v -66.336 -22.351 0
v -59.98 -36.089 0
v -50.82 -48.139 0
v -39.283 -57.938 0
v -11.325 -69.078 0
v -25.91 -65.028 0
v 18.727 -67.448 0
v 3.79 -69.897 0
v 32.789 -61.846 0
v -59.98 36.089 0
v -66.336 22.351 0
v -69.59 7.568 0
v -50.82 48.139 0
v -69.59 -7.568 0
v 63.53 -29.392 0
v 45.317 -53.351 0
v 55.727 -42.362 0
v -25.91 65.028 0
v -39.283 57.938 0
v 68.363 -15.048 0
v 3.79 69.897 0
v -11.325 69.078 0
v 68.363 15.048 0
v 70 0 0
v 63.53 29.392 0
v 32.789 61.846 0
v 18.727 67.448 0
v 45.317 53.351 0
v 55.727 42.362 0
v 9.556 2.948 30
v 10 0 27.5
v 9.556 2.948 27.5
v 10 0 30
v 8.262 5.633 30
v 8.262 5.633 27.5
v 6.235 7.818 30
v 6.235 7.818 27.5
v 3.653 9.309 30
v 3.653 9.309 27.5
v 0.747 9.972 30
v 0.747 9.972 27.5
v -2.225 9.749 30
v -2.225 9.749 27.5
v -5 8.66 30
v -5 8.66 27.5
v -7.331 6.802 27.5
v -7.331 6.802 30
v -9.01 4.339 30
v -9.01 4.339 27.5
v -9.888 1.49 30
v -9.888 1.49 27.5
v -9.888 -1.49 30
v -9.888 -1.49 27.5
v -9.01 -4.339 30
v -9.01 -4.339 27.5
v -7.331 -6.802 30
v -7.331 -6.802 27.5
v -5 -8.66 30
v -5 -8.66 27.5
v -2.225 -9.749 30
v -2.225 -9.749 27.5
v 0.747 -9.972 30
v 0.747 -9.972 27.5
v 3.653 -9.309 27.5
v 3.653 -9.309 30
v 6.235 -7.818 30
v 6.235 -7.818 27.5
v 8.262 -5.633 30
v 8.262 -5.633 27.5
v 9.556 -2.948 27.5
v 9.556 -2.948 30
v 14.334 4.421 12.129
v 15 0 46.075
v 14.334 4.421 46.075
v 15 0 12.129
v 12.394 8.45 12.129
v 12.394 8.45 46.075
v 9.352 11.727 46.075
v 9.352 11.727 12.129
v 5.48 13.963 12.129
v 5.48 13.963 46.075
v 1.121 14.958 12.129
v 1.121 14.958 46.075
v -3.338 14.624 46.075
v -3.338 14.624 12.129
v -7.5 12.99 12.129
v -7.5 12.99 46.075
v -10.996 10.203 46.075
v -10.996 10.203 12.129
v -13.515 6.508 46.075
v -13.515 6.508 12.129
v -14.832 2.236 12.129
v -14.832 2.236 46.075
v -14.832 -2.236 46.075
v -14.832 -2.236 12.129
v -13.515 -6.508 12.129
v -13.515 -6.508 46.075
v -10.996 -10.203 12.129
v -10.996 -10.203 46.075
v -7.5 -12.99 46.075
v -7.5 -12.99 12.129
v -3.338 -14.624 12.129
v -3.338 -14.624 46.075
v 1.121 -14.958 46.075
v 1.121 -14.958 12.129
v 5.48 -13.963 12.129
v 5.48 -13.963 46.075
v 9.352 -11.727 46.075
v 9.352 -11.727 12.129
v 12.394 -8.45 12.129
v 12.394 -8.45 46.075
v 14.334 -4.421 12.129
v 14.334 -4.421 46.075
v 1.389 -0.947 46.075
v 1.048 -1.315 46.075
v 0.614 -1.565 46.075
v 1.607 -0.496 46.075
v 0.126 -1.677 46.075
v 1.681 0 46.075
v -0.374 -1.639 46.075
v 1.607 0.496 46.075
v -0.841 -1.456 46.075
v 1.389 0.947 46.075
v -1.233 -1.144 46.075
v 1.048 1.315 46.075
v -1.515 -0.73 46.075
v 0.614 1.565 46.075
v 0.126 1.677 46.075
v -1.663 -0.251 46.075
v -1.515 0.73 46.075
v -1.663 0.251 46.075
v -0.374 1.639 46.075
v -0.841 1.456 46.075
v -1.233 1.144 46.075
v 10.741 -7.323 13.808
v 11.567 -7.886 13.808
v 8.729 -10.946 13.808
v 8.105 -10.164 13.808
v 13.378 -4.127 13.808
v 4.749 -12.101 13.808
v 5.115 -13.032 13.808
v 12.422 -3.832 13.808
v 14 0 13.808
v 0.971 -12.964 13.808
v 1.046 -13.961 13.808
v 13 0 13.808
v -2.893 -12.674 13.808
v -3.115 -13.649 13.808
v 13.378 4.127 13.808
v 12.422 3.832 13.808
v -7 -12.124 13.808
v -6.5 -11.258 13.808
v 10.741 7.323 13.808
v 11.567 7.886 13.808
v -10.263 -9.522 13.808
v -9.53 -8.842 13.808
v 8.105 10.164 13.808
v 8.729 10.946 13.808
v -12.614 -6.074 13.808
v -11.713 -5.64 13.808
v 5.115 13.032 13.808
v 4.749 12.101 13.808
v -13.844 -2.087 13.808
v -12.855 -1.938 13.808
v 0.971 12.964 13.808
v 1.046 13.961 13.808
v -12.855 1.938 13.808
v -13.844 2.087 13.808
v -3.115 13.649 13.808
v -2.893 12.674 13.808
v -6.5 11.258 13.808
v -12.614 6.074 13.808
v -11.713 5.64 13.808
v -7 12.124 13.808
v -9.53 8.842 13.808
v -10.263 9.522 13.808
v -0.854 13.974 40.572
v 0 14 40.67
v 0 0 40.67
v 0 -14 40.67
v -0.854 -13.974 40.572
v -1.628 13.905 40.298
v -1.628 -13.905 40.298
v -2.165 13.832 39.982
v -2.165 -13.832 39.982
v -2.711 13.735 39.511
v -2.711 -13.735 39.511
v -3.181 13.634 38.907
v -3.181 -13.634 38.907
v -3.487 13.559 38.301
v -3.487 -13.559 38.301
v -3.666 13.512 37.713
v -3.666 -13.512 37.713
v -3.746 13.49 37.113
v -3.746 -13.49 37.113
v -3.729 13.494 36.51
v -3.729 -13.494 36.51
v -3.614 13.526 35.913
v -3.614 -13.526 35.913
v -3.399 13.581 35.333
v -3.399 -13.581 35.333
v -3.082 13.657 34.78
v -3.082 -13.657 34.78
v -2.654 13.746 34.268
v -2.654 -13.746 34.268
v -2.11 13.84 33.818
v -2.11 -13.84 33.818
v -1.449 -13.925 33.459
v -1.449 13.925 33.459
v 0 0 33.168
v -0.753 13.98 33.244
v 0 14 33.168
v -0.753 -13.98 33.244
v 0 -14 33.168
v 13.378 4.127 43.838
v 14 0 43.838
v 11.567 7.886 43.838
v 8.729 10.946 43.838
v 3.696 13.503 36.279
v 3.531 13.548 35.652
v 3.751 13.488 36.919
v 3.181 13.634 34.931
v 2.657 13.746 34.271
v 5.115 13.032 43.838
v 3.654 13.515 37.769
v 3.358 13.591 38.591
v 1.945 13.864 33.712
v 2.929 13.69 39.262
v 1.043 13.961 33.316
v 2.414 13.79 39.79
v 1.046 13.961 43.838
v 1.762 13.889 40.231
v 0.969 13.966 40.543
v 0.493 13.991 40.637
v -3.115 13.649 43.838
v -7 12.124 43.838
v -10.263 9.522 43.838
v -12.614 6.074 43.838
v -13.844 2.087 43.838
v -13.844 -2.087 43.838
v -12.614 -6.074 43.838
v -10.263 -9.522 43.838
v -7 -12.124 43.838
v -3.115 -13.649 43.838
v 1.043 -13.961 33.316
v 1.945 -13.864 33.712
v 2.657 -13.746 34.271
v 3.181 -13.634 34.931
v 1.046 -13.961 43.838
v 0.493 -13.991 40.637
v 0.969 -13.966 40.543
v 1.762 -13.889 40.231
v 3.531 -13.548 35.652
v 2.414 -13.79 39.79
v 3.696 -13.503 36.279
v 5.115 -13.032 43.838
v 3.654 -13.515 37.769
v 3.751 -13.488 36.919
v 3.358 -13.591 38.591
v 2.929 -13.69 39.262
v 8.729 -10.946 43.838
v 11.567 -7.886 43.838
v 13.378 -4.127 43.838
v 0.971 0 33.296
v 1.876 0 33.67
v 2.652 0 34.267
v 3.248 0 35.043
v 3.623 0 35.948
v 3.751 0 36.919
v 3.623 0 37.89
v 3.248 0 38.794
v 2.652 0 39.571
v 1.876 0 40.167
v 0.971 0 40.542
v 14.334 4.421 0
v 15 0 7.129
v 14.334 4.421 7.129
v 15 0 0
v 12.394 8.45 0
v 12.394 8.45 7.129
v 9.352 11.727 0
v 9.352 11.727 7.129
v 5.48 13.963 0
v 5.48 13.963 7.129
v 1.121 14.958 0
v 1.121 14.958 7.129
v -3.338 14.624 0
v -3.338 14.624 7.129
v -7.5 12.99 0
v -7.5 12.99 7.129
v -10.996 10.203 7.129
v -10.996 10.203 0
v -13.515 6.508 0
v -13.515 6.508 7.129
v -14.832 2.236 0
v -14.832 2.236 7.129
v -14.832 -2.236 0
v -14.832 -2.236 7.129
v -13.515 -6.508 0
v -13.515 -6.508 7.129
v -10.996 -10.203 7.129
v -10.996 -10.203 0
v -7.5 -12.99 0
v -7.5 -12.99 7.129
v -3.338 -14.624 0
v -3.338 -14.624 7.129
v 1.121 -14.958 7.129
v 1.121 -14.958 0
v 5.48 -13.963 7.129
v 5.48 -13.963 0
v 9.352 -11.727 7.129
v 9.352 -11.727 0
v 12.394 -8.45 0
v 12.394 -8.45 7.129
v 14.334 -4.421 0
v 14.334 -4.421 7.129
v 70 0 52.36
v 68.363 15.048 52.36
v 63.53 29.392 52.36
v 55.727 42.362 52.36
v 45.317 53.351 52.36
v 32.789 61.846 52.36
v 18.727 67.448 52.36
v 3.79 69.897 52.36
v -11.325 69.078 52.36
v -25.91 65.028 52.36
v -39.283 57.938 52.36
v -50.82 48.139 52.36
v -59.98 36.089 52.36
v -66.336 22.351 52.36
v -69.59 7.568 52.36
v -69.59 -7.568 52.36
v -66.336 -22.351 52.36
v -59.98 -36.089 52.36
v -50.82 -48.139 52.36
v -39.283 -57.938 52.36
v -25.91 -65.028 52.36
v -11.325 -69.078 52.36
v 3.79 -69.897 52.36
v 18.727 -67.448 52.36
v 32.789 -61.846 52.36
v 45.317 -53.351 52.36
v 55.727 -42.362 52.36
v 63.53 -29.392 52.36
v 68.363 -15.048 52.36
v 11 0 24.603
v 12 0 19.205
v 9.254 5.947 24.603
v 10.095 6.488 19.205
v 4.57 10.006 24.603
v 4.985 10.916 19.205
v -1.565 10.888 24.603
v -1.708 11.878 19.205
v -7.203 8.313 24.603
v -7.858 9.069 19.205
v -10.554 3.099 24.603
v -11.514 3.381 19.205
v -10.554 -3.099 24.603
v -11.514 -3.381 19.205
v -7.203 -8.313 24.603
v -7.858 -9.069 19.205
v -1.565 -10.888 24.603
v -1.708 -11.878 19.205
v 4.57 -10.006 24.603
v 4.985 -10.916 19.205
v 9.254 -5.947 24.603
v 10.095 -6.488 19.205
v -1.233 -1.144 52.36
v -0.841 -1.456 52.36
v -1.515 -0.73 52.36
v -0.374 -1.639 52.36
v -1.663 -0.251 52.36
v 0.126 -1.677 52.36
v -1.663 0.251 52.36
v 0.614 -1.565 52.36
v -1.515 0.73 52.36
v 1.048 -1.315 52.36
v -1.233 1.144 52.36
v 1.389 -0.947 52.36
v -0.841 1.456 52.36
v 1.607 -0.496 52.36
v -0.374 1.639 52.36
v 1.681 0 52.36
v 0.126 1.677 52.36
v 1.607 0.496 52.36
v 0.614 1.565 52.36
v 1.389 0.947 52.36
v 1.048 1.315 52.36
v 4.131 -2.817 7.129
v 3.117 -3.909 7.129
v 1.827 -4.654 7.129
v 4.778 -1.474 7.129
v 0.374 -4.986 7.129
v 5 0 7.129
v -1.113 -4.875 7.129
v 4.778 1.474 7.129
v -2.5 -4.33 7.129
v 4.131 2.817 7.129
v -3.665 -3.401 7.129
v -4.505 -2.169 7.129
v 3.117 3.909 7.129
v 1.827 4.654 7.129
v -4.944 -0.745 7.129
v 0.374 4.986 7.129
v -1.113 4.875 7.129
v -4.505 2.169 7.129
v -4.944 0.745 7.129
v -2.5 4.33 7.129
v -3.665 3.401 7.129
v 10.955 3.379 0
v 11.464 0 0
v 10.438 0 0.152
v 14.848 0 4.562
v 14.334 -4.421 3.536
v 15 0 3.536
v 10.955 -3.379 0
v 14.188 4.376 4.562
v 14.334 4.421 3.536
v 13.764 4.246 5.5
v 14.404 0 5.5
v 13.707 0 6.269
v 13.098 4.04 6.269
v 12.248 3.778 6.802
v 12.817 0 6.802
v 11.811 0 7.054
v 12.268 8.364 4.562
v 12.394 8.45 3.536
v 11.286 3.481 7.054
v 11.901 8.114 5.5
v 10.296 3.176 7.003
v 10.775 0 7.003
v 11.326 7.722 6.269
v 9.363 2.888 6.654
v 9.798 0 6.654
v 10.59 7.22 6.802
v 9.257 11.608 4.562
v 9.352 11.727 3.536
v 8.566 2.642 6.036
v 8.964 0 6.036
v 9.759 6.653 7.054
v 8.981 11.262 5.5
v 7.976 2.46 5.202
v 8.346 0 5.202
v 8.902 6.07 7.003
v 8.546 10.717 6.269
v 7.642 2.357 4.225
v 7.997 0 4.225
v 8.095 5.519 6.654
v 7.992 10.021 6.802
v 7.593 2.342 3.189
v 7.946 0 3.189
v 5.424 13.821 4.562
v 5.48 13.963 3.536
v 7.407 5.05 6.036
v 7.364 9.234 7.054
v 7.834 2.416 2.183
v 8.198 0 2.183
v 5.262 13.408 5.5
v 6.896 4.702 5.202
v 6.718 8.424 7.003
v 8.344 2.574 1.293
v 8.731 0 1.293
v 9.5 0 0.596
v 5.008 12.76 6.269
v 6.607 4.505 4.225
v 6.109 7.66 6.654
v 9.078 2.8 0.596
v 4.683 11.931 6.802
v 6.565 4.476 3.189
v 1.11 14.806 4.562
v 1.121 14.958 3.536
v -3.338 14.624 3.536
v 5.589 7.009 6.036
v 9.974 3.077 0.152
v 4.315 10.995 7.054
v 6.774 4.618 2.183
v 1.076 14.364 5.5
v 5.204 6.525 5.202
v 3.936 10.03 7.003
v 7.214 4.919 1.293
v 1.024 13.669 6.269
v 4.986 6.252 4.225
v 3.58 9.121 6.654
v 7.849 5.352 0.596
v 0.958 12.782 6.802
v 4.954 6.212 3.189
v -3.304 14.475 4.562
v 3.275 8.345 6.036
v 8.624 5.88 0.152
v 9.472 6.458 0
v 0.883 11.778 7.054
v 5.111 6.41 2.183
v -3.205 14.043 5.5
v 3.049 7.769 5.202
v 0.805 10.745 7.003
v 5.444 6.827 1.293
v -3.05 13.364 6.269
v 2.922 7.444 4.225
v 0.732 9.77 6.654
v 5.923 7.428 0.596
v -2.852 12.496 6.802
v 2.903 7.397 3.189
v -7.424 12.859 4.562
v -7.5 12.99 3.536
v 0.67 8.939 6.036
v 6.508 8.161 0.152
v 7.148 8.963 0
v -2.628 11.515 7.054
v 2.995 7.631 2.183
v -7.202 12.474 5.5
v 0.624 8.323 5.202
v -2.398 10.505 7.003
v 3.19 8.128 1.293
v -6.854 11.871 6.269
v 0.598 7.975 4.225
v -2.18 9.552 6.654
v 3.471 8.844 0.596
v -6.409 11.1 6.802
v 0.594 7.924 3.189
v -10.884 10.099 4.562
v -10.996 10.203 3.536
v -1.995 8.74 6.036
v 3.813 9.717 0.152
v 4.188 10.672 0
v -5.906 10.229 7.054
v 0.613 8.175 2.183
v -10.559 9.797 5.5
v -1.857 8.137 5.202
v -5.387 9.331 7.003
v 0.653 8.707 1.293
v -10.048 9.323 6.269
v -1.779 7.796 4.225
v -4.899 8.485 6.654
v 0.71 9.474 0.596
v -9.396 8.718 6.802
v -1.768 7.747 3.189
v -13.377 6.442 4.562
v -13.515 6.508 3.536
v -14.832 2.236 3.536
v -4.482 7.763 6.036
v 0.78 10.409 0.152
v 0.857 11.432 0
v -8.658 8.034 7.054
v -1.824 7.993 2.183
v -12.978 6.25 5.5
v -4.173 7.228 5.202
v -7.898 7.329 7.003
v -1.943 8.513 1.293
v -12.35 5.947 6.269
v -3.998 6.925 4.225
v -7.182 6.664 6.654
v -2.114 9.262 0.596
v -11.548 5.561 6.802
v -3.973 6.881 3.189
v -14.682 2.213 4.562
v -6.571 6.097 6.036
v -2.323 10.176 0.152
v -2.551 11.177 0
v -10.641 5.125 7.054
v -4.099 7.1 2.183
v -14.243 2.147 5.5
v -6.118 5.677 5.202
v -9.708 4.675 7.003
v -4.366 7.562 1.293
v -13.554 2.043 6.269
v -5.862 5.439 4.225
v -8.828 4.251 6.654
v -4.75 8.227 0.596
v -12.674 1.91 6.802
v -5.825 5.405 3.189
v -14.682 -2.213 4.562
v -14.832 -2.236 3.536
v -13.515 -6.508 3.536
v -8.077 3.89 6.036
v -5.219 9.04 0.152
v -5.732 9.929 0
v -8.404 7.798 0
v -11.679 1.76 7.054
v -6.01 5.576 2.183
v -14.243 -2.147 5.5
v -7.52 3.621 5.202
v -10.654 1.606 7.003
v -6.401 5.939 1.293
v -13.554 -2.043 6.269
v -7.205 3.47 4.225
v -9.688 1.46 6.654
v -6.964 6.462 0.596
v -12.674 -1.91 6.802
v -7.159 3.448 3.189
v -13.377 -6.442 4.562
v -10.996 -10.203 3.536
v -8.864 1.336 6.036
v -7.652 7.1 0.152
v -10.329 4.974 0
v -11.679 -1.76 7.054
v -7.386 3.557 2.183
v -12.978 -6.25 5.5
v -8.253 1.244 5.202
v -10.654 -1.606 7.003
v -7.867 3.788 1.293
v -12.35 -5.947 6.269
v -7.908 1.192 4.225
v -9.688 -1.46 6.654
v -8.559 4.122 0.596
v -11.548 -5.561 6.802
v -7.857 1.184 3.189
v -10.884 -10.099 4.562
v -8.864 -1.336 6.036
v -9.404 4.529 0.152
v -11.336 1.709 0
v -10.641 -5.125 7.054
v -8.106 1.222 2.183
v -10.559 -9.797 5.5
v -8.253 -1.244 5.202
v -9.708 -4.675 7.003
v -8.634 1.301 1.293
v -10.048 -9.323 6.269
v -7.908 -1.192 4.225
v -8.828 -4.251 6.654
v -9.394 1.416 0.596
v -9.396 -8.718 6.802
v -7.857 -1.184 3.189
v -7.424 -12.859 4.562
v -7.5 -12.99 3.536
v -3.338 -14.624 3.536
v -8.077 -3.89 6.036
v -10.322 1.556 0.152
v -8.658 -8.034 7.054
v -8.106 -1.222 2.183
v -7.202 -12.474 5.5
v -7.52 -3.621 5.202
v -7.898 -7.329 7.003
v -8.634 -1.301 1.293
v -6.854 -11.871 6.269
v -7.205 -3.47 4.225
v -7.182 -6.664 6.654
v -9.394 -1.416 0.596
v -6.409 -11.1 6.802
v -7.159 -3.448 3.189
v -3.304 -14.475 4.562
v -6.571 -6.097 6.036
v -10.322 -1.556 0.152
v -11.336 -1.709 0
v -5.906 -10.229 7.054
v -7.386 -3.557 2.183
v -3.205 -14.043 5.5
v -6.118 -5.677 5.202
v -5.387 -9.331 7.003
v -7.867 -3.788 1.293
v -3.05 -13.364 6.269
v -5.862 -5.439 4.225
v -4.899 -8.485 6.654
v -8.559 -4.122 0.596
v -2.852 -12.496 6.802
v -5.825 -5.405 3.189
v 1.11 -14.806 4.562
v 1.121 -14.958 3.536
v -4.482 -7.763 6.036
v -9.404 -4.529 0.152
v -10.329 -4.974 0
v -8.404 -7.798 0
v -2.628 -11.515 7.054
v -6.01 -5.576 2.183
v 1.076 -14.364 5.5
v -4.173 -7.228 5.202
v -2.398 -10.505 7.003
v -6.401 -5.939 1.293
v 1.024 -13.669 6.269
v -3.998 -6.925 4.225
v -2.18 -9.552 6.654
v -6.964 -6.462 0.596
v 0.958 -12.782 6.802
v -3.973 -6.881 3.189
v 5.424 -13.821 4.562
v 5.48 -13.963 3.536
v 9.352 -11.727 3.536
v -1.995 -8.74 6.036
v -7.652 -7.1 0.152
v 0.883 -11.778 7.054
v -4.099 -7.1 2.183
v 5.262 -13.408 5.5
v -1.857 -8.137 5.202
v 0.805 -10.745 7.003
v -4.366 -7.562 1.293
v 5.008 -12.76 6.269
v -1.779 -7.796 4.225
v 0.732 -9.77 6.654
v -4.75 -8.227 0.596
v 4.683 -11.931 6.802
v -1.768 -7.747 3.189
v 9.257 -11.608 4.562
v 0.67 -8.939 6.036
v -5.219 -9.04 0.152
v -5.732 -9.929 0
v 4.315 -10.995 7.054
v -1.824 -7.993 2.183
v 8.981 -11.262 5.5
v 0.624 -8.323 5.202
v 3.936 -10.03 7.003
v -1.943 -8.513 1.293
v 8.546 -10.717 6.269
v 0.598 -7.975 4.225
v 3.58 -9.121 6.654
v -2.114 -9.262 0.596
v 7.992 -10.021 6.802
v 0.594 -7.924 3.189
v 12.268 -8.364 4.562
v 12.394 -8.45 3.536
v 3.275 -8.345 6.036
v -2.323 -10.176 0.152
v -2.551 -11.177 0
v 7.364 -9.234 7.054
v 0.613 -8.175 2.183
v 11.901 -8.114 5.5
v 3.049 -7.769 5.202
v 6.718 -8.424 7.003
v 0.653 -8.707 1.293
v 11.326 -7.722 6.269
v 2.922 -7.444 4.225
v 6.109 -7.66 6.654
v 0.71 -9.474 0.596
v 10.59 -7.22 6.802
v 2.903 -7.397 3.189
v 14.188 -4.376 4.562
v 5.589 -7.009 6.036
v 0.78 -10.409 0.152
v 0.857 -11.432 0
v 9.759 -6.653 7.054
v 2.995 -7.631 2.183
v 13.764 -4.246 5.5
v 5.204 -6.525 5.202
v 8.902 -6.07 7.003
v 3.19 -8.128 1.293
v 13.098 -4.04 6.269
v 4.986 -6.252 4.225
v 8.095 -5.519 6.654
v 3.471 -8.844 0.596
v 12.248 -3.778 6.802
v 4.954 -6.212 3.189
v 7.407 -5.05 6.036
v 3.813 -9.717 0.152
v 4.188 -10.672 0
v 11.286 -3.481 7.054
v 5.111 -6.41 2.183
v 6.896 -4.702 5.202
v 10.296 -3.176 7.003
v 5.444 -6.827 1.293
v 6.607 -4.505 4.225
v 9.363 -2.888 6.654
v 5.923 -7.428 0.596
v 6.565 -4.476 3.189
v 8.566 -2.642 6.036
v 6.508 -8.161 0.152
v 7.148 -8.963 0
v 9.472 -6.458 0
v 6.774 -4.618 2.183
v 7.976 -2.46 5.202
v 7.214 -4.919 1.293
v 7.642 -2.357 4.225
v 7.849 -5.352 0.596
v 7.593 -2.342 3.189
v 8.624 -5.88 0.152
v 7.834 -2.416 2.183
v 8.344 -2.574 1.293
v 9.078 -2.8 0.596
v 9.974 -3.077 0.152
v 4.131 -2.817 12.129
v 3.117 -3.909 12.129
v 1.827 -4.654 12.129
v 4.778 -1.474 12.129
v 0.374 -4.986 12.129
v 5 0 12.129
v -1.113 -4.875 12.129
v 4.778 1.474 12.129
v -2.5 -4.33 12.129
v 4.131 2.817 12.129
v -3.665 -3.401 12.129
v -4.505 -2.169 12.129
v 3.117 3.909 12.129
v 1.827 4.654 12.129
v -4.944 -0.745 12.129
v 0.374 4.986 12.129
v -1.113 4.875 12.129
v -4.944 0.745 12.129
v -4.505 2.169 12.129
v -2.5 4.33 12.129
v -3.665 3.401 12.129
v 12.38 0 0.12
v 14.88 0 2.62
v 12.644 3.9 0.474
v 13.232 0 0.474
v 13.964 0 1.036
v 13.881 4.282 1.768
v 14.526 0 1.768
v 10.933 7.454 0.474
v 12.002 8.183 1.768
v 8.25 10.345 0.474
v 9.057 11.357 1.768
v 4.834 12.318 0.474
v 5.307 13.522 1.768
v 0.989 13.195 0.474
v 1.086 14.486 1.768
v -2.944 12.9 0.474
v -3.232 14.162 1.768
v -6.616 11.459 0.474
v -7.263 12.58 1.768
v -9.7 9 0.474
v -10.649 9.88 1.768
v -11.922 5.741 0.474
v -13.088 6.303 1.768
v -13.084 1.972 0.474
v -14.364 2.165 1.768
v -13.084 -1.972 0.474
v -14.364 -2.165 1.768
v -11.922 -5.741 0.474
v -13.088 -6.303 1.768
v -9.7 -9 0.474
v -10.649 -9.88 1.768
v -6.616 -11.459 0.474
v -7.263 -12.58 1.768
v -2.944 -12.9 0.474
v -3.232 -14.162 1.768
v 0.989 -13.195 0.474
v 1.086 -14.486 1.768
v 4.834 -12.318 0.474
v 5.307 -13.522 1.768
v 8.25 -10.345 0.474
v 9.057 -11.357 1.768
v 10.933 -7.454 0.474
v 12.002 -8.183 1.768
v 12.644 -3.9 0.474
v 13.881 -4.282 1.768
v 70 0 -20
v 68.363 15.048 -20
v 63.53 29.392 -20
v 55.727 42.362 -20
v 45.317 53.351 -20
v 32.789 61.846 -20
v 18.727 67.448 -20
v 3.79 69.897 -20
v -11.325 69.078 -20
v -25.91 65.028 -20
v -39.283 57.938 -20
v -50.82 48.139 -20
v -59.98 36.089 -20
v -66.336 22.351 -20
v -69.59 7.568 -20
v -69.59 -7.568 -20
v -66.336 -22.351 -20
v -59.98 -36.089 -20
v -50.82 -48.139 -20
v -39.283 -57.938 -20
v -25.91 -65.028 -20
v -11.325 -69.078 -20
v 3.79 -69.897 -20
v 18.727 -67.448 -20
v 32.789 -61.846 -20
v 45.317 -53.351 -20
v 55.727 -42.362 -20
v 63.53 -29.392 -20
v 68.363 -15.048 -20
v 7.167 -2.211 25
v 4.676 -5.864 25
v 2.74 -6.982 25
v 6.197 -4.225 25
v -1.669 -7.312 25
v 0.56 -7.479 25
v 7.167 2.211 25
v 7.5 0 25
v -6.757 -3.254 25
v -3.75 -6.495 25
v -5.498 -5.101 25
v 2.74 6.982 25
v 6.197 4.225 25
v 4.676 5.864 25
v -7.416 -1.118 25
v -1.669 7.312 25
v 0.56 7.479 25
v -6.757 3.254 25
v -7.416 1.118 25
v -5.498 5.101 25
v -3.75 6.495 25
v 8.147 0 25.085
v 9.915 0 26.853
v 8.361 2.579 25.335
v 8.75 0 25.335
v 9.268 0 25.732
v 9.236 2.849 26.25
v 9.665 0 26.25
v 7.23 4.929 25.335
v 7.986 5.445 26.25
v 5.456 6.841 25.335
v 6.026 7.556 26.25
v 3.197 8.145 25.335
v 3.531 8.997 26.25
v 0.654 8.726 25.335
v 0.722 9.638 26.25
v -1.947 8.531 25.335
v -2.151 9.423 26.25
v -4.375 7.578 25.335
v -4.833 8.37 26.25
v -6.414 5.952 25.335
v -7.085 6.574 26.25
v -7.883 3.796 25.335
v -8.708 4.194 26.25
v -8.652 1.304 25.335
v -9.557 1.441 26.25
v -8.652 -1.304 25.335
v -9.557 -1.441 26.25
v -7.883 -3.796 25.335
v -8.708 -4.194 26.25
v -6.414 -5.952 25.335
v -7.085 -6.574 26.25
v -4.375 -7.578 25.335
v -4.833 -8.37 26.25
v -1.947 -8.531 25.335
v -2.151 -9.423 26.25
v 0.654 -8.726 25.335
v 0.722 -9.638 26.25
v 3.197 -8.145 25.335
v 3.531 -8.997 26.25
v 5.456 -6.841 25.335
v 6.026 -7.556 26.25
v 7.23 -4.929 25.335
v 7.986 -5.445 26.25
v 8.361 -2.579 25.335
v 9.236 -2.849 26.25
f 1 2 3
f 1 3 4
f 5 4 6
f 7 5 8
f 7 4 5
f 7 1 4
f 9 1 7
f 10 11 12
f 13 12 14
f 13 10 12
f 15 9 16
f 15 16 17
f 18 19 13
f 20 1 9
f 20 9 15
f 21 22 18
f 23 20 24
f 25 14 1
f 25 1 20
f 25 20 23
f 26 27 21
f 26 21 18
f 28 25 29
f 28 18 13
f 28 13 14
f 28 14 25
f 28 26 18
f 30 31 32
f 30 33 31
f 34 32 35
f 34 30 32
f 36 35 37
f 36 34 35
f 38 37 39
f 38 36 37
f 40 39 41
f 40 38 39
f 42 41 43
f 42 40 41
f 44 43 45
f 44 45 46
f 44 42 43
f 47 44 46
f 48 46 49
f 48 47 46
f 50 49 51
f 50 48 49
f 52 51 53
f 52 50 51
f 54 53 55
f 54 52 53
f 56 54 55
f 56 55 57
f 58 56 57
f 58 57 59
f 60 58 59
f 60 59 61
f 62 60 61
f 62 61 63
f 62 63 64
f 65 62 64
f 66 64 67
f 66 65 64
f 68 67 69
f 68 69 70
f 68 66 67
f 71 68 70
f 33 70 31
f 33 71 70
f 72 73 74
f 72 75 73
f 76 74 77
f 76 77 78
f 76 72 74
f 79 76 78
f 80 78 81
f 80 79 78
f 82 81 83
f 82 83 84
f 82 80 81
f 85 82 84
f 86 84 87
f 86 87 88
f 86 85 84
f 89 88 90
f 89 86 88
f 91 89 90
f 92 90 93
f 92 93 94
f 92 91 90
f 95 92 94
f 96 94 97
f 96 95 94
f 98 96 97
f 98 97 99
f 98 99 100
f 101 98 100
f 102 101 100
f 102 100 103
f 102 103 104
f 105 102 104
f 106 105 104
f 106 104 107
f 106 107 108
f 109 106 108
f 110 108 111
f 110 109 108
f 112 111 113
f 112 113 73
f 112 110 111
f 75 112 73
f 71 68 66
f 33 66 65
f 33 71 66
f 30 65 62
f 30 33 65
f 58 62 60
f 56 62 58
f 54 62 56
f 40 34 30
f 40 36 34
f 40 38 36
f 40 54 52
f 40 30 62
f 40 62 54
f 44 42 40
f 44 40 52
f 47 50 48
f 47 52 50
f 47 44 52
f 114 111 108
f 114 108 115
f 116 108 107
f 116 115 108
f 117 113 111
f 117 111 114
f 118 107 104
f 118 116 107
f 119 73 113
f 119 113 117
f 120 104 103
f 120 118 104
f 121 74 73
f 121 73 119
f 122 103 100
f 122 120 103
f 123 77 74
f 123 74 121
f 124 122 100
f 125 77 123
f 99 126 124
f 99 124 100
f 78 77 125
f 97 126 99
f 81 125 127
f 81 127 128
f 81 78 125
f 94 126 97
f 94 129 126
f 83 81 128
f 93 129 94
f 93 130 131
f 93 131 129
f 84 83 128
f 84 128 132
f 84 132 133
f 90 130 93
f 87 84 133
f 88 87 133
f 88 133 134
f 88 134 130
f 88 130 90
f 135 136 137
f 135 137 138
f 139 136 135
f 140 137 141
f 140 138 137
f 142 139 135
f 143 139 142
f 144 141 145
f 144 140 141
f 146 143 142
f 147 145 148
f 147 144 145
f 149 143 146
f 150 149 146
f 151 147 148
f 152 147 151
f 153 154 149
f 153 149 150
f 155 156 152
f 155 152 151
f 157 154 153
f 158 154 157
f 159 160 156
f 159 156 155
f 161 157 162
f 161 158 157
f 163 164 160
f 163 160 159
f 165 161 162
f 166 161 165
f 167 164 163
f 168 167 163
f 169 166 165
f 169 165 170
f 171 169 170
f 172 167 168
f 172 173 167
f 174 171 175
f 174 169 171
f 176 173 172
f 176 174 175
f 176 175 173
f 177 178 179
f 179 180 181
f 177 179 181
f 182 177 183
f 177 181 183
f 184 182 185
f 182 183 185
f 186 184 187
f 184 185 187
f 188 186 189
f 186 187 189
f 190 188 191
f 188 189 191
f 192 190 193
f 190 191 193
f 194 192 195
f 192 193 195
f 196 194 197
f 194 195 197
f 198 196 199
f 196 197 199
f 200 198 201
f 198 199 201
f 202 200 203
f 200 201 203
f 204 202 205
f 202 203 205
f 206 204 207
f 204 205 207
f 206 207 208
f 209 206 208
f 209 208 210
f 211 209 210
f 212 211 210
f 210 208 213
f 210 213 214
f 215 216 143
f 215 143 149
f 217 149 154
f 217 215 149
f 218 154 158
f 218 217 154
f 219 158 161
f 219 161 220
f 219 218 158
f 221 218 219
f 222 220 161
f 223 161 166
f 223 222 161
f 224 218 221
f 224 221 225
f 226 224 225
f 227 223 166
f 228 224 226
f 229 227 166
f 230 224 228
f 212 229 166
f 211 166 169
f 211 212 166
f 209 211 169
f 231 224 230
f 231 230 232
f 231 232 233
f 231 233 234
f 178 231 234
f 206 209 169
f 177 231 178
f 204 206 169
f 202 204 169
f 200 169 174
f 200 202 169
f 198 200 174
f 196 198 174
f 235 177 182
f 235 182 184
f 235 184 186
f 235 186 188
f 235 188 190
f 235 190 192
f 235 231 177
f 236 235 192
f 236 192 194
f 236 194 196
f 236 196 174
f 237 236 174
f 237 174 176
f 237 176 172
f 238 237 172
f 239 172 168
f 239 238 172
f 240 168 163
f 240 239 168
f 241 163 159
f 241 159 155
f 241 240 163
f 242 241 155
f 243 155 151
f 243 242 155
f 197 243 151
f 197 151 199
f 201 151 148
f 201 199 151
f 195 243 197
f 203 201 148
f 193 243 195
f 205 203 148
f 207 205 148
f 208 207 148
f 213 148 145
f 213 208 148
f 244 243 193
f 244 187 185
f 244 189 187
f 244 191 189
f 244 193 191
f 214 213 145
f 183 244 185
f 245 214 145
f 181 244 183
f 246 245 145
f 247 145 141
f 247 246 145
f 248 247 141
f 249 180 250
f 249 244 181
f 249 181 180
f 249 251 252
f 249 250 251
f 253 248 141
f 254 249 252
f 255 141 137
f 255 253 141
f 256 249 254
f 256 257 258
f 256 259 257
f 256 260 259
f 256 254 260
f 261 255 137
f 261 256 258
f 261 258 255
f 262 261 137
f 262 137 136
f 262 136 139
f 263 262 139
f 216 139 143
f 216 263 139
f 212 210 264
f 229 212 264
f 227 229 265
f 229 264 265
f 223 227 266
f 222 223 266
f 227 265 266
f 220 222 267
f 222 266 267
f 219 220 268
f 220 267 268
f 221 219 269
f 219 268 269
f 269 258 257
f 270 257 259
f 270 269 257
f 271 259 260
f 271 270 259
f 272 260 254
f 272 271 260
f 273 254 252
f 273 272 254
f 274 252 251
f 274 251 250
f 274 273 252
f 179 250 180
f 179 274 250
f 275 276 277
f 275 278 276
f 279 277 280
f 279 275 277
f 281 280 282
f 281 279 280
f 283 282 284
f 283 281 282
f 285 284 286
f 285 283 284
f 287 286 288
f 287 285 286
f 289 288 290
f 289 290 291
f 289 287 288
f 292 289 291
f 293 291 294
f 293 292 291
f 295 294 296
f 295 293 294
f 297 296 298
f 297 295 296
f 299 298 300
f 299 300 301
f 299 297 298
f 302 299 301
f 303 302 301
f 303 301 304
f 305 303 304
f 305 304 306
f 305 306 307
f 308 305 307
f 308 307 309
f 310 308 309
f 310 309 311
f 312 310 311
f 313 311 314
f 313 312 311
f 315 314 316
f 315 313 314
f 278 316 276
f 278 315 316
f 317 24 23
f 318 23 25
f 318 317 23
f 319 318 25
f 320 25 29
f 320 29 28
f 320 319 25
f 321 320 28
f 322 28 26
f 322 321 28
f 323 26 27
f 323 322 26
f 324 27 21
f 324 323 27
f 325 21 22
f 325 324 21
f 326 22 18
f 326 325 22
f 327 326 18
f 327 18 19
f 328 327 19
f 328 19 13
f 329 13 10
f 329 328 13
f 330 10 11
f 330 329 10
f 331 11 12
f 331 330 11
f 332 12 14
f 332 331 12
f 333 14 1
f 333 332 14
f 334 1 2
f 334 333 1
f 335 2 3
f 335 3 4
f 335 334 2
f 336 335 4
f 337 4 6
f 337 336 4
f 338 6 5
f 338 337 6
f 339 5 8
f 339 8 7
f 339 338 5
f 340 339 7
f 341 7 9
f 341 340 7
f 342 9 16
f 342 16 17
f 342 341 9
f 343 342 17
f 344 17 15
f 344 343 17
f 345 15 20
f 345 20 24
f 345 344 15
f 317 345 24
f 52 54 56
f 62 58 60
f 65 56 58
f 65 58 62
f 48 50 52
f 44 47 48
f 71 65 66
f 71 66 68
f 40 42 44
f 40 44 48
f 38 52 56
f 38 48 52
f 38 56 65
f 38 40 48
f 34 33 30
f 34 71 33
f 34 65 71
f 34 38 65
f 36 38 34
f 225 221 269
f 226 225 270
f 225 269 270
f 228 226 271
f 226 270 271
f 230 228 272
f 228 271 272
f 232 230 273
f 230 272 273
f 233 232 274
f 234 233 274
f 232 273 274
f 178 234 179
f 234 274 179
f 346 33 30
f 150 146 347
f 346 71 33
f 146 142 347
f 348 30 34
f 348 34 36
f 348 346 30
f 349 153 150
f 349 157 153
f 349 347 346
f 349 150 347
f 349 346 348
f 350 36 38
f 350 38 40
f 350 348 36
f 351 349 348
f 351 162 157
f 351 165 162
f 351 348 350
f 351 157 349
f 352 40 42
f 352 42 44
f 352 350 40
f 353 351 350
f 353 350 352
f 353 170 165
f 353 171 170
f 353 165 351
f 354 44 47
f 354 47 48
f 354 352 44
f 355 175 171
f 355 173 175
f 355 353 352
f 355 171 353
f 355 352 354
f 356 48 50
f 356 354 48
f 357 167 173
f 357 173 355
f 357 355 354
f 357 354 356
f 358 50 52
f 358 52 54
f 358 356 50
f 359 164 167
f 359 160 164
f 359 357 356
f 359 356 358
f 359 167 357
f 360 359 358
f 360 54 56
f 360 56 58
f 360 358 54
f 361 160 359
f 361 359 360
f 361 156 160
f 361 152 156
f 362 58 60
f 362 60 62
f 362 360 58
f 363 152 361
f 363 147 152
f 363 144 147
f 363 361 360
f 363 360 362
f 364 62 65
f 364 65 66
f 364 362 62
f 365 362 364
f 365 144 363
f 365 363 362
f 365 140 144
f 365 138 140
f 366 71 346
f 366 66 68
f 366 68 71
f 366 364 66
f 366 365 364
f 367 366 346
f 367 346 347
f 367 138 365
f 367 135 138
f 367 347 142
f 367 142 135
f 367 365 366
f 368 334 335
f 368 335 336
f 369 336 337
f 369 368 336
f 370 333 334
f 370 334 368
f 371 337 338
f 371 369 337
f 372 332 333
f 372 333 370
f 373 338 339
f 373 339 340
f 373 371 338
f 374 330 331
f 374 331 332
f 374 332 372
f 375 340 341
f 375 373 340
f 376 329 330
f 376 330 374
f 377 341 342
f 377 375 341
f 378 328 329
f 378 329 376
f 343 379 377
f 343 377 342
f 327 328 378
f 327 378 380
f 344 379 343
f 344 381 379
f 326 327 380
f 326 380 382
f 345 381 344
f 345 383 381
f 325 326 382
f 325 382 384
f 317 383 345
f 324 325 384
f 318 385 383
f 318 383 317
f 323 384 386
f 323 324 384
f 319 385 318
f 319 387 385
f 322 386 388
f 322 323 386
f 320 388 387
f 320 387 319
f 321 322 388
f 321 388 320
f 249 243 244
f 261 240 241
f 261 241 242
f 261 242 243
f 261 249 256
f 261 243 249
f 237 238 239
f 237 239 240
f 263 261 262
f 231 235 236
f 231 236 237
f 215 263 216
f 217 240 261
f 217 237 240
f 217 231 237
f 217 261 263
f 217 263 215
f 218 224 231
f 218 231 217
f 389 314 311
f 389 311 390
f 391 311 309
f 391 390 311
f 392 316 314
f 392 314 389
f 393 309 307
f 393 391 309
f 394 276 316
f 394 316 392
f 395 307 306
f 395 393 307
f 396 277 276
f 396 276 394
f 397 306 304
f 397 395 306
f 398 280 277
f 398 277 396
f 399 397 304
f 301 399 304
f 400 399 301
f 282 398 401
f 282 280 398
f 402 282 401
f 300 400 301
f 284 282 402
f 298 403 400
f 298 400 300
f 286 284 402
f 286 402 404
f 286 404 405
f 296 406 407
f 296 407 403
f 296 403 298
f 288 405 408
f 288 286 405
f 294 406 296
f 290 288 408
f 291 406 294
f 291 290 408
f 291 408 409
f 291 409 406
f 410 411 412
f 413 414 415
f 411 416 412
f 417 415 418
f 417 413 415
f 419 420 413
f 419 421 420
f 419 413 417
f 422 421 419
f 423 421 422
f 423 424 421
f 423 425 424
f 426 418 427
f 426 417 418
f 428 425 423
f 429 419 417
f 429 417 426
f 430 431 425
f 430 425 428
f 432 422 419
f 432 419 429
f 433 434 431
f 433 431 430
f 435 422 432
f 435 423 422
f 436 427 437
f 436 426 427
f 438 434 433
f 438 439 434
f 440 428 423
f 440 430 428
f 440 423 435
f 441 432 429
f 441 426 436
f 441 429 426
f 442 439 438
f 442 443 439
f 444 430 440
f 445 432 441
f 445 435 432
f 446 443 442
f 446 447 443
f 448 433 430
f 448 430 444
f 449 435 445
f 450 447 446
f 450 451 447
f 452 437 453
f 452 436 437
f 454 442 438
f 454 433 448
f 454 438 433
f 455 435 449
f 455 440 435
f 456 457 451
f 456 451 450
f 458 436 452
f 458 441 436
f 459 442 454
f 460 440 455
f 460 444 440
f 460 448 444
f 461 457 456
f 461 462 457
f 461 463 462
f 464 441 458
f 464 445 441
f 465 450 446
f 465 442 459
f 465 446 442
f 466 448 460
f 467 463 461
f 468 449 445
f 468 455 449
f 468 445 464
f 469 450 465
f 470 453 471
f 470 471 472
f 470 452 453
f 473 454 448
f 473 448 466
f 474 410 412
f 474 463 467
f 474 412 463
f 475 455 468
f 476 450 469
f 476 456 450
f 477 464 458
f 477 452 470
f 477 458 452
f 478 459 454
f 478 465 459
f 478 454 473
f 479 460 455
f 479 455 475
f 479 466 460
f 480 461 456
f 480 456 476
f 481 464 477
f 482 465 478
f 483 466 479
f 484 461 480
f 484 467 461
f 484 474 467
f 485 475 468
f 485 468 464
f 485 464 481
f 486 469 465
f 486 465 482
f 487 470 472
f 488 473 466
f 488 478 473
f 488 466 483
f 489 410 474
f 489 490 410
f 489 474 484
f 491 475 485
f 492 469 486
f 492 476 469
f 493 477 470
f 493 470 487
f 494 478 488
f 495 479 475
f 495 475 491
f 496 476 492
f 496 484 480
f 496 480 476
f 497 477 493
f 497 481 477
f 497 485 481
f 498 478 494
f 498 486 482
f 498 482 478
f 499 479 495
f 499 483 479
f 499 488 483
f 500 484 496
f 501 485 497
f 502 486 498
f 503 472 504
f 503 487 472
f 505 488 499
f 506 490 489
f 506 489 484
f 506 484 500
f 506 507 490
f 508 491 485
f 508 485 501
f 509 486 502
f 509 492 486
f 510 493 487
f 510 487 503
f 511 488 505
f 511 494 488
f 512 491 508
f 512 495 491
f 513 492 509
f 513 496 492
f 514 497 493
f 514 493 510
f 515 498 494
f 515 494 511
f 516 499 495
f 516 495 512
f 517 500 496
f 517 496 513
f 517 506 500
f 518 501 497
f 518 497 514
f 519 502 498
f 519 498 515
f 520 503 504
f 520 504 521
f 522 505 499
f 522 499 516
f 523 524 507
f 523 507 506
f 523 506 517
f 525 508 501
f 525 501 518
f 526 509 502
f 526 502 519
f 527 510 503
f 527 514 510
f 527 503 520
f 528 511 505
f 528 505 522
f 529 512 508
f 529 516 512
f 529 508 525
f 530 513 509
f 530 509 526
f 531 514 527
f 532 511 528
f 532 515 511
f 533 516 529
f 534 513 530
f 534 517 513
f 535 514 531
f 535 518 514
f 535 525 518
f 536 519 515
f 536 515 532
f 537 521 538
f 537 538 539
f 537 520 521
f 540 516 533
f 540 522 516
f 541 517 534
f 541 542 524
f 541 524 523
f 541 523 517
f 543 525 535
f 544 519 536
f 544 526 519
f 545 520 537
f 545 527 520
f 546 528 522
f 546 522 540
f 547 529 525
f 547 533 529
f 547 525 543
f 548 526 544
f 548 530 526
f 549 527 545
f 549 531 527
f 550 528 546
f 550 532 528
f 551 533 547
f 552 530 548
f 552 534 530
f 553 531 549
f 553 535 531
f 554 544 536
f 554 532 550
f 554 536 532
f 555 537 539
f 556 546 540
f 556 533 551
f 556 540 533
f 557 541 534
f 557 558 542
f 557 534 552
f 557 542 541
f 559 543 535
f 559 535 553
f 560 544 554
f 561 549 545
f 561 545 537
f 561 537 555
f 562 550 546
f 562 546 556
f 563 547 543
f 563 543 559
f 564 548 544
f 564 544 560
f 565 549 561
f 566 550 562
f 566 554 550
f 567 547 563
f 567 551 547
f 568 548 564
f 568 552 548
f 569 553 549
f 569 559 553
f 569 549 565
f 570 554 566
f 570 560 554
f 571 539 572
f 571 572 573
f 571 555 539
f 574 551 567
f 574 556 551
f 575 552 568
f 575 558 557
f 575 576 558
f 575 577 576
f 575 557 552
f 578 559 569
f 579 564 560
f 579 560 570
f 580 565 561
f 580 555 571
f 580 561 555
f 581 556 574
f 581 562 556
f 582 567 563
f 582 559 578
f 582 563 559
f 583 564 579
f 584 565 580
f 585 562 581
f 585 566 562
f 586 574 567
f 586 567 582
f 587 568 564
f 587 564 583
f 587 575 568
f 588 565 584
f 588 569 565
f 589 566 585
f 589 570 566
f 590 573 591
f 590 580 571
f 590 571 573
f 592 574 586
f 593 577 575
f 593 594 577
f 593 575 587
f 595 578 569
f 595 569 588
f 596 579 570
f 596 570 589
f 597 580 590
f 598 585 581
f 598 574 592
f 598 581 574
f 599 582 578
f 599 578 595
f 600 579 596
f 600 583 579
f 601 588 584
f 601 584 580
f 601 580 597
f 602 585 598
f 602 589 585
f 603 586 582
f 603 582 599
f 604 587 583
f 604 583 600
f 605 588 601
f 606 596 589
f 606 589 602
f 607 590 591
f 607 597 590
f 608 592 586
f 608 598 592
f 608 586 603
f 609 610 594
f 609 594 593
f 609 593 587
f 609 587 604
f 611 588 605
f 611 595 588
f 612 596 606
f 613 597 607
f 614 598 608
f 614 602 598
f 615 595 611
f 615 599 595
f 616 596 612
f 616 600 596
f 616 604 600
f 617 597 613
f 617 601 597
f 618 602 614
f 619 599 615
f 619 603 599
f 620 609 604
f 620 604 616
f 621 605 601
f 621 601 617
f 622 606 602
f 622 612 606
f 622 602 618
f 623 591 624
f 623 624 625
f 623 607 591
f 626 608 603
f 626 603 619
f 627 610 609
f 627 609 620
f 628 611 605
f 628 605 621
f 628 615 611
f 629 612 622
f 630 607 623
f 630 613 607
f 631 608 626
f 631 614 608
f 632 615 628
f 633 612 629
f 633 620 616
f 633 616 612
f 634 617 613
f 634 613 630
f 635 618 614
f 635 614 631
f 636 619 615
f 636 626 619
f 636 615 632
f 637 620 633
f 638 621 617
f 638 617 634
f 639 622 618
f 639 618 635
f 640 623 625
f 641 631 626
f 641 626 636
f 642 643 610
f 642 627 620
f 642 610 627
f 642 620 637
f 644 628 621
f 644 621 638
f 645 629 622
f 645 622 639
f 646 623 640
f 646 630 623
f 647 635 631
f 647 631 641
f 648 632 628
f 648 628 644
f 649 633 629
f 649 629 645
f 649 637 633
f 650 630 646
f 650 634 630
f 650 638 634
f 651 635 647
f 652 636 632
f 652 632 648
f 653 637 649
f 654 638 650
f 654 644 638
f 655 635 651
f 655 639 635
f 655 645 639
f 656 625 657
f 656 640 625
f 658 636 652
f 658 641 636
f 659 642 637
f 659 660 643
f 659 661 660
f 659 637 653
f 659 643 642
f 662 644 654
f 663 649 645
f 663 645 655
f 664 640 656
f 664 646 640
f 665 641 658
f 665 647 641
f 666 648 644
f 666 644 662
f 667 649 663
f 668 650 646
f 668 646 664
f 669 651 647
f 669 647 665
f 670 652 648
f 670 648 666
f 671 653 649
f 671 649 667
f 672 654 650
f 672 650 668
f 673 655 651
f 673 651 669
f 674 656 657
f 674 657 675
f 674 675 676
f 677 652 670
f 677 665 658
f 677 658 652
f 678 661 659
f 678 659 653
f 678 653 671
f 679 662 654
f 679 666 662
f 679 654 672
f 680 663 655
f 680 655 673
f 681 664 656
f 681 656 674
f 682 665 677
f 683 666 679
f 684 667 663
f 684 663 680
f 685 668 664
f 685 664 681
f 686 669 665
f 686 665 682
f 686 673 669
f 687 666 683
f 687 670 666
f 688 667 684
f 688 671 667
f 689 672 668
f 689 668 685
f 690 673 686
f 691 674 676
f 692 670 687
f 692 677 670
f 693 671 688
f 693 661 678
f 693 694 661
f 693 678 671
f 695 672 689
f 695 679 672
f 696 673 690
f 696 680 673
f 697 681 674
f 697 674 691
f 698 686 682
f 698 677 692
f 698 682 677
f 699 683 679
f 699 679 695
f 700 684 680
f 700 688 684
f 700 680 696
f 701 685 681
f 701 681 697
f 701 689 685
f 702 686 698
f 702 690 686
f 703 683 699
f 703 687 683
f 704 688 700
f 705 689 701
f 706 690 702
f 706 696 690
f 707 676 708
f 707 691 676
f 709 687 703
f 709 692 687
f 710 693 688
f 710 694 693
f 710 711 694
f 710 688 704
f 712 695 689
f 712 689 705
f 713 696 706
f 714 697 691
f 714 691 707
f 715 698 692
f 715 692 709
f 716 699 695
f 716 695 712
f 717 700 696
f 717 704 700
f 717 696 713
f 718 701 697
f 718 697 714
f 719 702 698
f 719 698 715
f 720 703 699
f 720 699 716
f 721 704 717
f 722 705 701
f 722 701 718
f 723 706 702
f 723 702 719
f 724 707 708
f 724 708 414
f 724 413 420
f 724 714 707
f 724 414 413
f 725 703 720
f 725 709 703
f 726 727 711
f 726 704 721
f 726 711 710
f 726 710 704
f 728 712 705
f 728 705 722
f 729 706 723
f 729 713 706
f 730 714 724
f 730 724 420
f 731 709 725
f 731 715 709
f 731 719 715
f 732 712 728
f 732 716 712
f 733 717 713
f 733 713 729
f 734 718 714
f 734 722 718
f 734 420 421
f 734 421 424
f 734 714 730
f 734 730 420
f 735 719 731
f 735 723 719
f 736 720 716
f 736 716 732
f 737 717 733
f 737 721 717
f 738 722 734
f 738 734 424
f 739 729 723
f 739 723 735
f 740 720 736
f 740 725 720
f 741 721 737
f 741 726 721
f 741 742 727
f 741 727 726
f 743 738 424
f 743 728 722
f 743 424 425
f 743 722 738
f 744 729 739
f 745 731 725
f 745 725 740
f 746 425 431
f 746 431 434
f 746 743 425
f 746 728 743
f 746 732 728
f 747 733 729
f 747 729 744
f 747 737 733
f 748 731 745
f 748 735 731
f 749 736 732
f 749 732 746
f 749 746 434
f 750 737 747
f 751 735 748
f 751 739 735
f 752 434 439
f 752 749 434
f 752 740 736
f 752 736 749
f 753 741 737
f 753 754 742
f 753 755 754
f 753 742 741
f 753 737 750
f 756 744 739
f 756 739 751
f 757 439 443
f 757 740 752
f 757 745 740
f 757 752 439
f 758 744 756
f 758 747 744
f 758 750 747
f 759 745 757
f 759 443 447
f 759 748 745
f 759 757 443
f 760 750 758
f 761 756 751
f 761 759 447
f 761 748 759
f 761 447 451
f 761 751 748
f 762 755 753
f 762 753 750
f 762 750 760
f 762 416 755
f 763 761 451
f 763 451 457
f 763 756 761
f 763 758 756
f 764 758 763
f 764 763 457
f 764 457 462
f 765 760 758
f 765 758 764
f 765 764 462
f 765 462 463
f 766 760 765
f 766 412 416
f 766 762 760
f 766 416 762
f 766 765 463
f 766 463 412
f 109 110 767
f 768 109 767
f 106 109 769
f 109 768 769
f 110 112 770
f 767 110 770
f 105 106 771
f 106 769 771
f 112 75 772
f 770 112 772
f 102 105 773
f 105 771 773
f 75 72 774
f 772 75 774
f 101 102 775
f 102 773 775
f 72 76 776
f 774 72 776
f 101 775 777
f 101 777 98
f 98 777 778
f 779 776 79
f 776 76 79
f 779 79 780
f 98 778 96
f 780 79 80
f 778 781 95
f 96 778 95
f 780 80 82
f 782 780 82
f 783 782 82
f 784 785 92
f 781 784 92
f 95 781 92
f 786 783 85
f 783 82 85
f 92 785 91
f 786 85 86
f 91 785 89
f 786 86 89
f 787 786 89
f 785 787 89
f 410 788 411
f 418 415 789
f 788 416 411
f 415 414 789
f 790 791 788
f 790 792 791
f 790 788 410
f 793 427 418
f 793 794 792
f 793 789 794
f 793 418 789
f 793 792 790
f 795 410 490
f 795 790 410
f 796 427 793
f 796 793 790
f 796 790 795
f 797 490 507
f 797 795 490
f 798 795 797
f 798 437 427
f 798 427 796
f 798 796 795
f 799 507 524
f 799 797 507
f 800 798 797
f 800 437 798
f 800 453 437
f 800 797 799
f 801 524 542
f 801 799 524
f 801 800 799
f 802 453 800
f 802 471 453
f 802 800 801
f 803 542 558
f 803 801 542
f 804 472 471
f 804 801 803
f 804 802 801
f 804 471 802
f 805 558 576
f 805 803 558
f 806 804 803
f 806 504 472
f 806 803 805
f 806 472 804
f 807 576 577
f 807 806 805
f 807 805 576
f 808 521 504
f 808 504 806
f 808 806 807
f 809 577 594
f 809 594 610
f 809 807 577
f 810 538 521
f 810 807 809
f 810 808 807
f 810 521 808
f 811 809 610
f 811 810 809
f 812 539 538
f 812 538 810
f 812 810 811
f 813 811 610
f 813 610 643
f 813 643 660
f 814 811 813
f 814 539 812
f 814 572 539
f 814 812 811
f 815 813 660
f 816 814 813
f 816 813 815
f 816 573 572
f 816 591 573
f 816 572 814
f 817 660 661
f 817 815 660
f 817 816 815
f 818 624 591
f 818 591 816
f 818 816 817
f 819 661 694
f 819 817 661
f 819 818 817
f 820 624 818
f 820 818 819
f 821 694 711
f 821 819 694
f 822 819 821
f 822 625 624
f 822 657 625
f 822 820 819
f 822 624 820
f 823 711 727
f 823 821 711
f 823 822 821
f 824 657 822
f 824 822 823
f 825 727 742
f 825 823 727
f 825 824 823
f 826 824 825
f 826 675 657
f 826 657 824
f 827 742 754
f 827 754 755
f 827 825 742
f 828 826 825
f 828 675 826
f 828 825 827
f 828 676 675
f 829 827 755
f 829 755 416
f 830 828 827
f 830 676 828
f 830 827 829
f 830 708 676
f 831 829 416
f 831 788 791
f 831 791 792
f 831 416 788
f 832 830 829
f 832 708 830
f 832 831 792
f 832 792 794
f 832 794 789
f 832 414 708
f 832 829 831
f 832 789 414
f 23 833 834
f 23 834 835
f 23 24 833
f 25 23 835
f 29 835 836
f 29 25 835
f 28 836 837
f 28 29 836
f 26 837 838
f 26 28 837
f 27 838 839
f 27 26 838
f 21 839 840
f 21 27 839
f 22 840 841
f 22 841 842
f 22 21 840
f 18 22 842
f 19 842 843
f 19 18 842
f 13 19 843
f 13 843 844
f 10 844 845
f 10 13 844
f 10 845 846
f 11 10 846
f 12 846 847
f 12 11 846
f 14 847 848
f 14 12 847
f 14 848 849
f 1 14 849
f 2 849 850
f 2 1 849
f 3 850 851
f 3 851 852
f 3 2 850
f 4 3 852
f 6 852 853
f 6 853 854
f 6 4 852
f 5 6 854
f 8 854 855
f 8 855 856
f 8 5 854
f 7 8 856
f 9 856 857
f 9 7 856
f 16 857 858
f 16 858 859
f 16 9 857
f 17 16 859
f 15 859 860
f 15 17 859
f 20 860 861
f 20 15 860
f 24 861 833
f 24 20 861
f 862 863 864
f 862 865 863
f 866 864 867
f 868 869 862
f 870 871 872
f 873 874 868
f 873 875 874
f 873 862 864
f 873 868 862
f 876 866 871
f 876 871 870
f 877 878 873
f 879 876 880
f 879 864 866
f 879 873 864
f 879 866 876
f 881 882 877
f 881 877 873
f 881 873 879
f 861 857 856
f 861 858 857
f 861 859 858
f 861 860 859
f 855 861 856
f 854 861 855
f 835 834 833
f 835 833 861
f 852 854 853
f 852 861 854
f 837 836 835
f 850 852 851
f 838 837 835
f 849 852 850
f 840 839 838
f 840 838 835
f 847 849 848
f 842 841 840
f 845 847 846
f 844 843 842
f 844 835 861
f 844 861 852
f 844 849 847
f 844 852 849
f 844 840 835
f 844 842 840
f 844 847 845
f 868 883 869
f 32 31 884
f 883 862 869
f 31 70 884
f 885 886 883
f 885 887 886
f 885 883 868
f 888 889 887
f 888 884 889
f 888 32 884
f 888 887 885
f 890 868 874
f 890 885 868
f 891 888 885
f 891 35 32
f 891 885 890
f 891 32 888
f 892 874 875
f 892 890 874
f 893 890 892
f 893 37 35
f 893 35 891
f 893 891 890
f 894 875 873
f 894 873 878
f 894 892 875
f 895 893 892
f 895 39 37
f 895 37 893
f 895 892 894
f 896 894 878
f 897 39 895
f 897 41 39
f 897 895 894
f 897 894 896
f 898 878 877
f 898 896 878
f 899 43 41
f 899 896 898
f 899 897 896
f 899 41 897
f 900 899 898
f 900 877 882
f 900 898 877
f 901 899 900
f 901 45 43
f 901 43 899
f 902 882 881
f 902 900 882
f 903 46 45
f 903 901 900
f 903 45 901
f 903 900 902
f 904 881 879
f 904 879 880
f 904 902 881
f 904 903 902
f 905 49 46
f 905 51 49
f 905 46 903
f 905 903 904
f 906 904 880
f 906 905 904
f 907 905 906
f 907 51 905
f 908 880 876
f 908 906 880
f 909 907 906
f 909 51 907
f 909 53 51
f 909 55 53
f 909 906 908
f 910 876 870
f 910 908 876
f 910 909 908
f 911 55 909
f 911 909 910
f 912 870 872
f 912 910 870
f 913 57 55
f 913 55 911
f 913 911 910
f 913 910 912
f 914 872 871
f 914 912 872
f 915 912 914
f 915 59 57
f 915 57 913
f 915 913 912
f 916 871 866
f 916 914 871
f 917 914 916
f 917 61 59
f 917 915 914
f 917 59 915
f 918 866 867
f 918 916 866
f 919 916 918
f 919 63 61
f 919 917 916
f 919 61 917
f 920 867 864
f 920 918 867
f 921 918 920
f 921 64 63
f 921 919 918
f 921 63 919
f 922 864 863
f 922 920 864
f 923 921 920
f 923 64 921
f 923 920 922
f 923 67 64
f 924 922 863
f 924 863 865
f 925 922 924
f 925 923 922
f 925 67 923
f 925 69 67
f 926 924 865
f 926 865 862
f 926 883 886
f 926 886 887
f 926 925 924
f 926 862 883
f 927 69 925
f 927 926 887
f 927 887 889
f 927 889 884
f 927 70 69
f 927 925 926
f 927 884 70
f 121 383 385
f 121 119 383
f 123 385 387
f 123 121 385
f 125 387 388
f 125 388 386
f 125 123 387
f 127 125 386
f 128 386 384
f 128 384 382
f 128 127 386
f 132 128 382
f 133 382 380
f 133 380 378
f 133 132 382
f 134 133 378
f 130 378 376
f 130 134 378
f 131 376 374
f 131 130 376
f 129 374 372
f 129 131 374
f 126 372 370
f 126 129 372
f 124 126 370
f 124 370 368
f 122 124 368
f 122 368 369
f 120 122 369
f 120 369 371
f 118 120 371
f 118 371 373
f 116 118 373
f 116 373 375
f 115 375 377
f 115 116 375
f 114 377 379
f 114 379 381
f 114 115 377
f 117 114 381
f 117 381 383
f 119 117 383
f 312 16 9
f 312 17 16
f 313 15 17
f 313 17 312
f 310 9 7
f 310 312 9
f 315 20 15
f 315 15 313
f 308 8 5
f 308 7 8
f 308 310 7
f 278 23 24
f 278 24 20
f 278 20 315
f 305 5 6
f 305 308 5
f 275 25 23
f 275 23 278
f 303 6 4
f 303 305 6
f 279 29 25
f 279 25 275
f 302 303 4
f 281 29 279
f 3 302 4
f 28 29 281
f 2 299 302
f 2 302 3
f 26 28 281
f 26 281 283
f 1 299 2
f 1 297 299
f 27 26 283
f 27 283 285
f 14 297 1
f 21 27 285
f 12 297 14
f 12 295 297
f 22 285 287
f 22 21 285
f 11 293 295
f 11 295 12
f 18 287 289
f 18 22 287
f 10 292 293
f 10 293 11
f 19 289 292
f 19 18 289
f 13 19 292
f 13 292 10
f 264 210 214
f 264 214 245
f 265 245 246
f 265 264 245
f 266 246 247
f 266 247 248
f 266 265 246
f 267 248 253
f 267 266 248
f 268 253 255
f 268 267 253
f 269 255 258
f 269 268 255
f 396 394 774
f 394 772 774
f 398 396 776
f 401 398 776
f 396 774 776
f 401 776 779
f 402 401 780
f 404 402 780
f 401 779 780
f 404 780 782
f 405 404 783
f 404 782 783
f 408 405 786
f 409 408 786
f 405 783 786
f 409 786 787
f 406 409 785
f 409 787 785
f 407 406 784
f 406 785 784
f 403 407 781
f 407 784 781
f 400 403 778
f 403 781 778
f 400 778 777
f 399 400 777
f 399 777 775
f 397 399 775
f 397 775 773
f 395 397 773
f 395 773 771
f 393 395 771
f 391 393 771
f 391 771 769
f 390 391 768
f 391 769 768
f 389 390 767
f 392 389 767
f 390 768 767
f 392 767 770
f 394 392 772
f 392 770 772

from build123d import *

# Parameters (mm, degrees)
F2_DEPTH = 14
F0_W     = 10
F0_H     = 5


with BuildPart() as f1:
    # F0 (on Front) → F1 (revolve)
    with BuildSketch(Plane.XZ):
        with BuildLine():
            Line((0, 40.6699131573), (0, 33.1678688383))
            ThreePointArc((0, 33.1678688383), (2.6523732054, 34.2665177924), (3.7510221595, 36.9188909978))
            ThreePointArc((3.7510221595, 36.9188909978), (2.6523732054, 39.5712642031), (0, 40.6699131573))
        make_face()
        with BuildLine():
            Line((0, 33.1678688383), (0, 30))
            Line((0, 30), (10, 30))
            Line((10, 30), (13, 13.8075612485))
            Line((13, 13.8075612485), (14, 13.8075612485))
            Line((14, 13.8075612485), (14, 43.8377819955))
            Line((14, 43.8377819955), (0, 43.8377819955))
            Line((0, 43.8377819955), (0, 40.6699131573))
            ThreePointArc((0, 40.6699131573), (2.6523732054, 39.5712642031), (3.7510221595, 36.9188909978))
            ThreePointArc((3.7510221595, 36.9188909978), (2.6523732054, 34.2665177924), (0, 33.1678688383))
        make_face()
    revolve(axis=Axis((0, 0, 15), (0, 0, 1)))

    # F0 (on Front) → F2 (cut, symmetric)
    with BuildSketch(Plane.XZ):
        with BuildLine():
            ThreePointArc((0, 40.6699131573), (-3.7510221595, 36.9188909978), (0, 33.1678688383))
            Line((0, 33.1678688383), (0, 40.6699131573))
        make_face()
        with BuildLine():
            Line((0, 40.6699131573), (0, 33.1678688383))
            ThreePointArc((0, 33.1678688383), (2.6523732054, 34.2665177924), (3.7510221595, 36.9188909978))
            ThreePointArc((3.7510221595, 36.9188909978), (2.6523732054, 39.5712642031), (0, 40.6699131573))
        make_face()
    extrude(amount=F2_DEPTH, both=True, mode=Mode.SUBTRACT)


with BuildPart() as f3:
    # F0 (on Front) → F3 (revolve)
    with BuildSketch(Plane.XZ):
        with BuildLine():
            ThreePointArc((11.4644660941, 0), (13.9644660941, 1.0355339059), (15, 3.5355339059))
            ThreePointArc((15, 3.5355339059), (8.9644660941, 6.0355339059), (11.4644660941, 0))
        make_face()
    revolve(axis=Axis((0, 0, 15), (0, 0, 1)))


with BuildPart() as f4:
    # F0 (on Front) → F4 (revolve)
    with BuildSketch(Plane.XZ):
        with BuildLine():
            Line((10, 30), (0, 30))
            Line((0, 30), (0, 25))
            Line((0, 25), (7.5, 25))
            ThreePointArc((7.5, 25), (9.267766953, 25.732233047), (10, 27.5))
            Line((10, 27.5), (10, 30))
        make_face()
    revolve(axis=Axis((0, 0, 15), (0, 0, 1)))


with BuildPart() as f5:
    # F0 (on Front) → F5 (revolve)
    with BuildSketch(Plane.XZ):
        Polygon((15, 7.1290568449), (15, 3.5355339059), (15, 0), (70, 0), (70, 52.3596480489), (1.6814888222, 52.3596480489), (1.6814888222, 46.0751764476), (15, 46.0751764476), (15, 12.1290568449), align=None)
        with Locations((10, 9.6290568449)):
            Rectangle(F0_W, F0_H)
    revolve(axis=Axis((0, 0, 15), (0, 0, 1)))


with BuildPart() as f6:
    # F0 (on Front) → F6 (revolve)
    with BuildSketch(Plane.XZ):
        Polygon((15, 0), (11.4644660941, 0), (0, 0), (0, -20), (70, -20), (70, 0), align=None)
    revolve(axis=Axis((0, 0, 15), (0, 0, 1)))


solid = Compound([f1.part, f3.part, f4.part, f5.part, f6.part])
